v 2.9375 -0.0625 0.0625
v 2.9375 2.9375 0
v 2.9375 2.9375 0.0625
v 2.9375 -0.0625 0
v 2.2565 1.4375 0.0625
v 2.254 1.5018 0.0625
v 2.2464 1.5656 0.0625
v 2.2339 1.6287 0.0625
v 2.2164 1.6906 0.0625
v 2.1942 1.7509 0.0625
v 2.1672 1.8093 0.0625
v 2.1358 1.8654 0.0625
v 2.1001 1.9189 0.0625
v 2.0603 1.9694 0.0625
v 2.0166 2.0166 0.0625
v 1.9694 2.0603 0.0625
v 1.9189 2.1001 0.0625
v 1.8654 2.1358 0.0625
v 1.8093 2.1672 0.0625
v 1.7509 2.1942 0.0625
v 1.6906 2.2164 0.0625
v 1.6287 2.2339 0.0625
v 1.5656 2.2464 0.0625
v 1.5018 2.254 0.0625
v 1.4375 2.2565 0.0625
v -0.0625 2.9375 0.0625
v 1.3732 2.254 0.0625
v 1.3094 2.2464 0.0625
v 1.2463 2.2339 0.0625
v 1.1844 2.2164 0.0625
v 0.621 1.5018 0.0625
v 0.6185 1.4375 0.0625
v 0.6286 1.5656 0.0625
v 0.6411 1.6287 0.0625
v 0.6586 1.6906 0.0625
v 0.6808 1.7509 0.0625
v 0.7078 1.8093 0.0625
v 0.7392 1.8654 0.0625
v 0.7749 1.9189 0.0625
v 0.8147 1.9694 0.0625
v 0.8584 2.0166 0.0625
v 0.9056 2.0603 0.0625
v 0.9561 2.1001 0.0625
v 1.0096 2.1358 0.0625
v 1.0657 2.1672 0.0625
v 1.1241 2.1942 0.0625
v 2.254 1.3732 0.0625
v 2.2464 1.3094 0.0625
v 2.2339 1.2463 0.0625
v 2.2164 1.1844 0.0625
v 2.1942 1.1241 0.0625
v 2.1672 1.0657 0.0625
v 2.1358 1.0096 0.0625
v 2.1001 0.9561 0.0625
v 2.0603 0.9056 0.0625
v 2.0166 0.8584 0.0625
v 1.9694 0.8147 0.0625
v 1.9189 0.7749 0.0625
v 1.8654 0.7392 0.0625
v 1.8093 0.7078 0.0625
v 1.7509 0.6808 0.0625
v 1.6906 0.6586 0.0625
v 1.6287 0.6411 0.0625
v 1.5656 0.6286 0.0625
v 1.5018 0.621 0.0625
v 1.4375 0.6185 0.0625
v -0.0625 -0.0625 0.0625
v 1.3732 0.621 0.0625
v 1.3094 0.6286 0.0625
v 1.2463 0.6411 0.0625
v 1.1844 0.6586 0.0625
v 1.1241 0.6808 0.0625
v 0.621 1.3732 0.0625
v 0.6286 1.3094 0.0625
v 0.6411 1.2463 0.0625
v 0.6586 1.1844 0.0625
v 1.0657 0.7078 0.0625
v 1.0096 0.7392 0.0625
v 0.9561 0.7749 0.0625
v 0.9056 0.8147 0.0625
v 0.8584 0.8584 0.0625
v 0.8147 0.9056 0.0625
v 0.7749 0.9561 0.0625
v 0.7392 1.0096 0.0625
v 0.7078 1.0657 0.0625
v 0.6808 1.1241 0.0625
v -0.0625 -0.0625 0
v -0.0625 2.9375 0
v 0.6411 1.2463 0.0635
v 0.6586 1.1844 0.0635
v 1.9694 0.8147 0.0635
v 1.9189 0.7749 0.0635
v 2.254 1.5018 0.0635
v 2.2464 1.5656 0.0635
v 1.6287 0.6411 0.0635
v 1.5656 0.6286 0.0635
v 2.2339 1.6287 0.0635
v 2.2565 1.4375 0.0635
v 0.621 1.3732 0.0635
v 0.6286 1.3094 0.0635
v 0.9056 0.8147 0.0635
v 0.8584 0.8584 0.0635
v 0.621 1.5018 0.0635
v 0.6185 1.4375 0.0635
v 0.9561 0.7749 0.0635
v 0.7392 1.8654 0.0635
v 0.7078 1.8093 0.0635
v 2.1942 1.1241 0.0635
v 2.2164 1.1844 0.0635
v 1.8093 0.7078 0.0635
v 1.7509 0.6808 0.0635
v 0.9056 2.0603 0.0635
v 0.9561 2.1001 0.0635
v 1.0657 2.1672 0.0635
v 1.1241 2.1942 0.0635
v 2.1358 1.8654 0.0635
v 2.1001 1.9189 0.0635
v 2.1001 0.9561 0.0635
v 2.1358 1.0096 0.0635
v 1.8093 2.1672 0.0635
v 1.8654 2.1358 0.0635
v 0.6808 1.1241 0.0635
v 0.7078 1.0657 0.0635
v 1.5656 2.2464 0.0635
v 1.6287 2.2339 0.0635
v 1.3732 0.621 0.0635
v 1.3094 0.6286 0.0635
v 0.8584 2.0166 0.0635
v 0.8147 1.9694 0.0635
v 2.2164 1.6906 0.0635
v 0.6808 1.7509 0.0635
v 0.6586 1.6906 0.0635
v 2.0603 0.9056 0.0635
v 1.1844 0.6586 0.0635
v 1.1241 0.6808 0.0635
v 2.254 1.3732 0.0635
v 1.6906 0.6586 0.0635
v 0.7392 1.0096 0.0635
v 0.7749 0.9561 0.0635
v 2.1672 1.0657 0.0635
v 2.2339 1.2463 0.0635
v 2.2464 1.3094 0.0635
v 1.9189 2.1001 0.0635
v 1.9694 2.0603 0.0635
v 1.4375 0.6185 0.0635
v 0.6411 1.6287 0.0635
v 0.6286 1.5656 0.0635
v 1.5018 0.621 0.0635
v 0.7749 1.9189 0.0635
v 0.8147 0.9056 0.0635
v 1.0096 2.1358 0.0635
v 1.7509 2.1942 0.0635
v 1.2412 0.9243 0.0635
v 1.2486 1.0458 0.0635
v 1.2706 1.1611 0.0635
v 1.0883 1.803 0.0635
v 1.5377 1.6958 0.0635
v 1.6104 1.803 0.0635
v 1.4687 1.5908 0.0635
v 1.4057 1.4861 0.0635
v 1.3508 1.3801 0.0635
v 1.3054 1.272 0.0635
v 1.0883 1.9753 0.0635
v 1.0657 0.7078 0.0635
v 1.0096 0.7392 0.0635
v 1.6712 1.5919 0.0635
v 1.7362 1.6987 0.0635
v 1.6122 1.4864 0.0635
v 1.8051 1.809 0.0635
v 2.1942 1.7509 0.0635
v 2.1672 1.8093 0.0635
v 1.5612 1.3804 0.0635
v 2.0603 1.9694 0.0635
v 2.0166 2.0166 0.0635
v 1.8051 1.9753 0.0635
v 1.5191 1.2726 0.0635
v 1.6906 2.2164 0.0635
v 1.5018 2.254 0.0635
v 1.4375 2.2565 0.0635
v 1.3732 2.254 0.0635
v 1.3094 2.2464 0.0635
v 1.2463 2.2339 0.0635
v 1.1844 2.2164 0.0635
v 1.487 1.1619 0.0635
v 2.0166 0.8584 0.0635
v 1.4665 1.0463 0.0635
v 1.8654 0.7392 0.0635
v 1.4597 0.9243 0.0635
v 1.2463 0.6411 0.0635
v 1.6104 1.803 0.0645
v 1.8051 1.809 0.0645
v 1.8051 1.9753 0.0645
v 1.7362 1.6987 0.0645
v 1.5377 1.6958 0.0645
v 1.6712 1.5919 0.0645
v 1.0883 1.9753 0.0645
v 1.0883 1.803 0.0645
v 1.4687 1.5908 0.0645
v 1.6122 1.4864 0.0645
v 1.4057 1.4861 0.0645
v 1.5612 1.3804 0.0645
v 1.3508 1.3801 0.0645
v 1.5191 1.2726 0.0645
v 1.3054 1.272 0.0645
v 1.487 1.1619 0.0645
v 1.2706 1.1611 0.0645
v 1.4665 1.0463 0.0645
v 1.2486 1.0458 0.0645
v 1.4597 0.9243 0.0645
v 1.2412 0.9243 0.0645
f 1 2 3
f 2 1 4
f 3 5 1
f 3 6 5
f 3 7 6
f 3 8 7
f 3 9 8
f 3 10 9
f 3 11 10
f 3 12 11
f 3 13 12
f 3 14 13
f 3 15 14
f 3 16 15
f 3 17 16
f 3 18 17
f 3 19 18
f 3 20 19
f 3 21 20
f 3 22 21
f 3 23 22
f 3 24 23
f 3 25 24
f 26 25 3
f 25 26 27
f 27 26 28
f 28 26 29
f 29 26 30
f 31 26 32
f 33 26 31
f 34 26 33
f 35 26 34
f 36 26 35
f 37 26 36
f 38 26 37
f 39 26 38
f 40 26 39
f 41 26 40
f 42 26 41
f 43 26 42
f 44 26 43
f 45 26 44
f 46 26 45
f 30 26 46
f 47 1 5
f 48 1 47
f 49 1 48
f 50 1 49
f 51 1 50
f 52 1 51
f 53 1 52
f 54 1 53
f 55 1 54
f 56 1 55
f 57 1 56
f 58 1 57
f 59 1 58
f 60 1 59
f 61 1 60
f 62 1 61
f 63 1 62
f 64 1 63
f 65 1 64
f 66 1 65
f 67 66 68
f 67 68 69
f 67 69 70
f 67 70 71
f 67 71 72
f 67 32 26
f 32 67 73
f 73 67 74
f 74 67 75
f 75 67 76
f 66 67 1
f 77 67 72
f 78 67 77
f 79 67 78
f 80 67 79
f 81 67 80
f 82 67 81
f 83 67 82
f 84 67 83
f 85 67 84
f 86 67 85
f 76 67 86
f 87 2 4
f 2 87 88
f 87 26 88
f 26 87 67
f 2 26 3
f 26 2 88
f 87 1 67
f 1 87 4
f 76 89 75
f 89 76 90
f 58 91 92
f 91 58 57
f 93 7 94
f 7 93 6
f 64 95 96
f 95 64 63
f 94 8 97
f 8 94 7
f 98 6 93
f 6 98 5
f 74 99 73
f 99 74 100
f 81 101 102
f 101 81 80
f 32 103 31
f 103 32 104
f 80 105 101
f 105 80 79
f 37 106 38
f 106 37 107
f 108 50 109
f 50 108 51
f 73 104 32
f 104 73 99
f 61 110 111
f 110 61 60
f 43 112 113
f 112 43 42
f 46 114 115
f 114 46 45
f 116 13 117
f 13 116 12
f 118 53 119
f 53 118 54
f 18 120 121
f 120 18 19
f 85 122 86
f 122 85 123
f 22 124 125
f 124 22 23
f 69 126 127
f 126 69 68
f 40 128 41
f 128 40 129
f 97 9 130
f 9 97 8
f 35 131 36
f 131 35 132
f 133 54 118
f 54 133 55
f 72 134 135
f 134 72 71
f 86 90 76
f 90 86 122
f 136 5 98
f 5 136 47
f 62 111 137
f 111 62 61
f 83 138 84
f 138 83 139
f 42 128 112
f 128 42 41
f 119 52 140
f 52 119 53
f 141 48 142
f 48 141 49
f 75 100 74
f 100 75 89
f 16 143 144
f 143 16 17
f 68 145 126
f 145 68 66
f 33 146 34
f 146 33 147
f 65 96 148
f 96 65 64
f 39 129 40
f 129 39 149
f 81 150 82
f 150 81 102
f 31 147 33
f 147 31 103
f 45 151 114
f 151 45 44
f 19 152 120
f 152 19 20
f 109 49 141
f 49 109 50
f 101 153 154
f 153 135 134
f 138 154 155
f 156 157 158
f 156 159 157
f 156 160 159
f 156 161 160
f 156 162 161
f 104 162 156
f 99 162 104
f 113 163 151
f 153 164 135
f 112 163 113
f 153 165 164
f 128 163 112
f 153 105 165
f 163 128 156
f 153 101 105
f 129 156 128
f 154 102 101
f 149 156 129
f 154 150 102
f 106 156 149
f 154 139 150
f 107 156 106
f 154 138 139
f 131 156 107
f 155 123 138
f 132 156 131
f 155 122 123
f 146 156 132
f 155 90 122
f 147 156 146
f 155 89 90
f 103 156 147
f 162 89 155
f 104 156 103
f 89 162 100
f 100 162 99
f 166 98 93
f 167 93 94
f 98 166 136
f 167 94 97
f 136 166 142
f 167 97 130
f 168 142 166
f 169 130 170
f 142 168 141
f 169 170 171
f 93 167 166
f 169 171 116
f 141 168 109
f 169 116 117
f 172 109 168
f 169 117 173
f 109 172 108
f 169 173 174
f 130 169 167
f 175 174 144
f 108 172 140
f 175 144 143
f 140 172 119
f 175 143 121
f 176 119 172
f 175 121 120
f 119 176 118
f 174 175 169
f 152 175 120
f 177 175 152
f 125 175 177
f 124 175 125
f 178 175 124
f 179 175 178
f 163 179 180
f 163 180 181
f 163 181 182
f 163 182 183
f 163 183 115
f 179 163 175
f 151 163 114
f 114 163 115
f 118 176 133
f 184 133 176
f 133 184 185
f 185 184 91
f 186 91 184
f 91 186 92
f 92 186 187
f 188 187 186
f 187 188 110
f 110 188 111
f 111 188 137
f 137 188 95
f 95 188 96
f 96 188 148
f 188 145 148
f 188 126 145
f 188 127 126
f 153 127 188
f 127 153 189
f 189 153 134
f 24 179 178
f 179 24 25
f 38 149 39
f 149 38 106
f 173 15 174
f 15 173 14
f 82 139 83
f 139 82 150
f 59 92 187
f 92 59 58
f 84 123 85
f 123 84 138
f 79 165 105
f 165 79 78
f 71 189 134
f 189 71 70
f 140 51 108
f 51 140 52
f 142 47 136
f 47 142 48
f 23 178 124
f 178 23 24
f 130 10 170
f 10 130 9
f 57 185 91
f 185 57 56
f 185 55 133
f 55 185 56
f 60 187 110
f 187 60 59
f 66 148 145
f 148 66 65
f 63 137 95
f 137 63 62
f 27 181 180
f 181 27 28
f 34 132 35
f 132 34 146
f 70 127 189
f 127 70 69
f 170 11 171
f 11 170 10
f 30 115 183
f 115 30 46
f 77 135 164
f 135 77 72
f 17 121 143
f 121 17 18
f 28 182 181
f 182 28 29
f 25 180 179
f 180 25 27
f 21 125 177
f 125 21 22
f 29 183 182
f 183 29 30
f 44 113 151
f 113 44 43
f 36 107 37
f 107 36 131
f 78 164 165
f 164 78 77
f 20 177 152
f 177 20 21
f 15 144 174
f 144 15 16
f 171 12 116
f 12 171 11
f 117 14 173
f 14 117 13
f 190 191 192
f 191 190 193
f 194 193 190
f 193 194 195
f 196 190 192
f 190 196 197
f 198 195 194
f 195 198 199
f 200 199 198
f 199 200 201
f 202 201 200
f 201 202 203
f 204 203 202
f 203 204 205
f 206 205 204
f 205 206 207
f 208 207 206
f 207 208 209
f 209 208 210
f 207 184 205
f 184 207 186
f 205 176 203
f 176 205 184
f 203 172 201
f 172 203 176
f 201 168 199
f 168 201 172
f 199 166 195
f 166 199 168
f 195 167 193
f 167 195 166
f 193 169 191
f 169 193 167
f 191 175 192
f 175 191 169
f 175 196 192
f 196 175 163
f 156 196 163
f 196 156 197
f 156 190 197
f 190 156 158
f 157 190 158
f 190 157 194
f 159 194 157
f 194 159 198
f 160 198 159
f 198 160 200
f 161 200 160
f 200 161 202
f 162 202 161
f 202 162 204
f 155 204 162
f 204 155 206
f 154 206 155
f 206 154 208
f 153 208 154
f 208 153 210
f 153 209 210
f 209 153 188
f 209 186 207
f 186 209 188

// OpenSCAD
// element110.scad
// Spur gear tile — centered black gear ring with trapezoidal teeth.
// The open bore reveals a lighter interior (gear_bore module).
// Units: inches

plate_w = 2 + 7/8;
plate_d = 2 + 7/8;
plate_h = 1/16;
frame_w = 1/16;

hole_d = 3/32;
hole_r = hole_d / 2;

// Gear geometry — centered on tile
gear_n      = 20;    // number of teeth
gear_r_tip  = 1.18;  // outer radius at tooth tips
gear_r_root = 1.00;  // root radius at base of teeth
gear_r_bore = 0.82;  // bore (inner hole) radius
tooth_hw    = 4.5;   // half-angle of each tooth in degrees (total = 9°, gap = 9°)
tooth_tip_f = 0.80;  // tooth tip is narrower than base by this factor

// ── Standard modules ─────────────────────────────────────────────────────────

module rivet_holes() {
    spacing_x = plate_w / 10;
    spacing_y = plate_d / 10;
    inset_x   = spacing_x / 2;
    inset_y   = spacing_y / 2;
    // Front edge
    for (i = [0:9])
        translate([inset_x + i * spacing_x, inset_y,         -1])
            cylinder(h = plate_h + 2, r = hole_r, $fn = 20);
    // Back edge
    for (i = [0:9])
        translate([inset_x + i * spacing_x, plate_d - inset_y, -1])
            cylinder(h = plate_h + 2, r = hole_r, $fn = 20);
    // Left edge
    for (i = [0:9])
        translate([inset_x,           inset_y + i * spacing_y, -1])
            cylinder(h = plate_h + 2, r = hole_r, $fn = 20);
    // Right edge
    for (i = [0:9])
        translate([plate_w - inset_x, inset_y + i * spacing_y, -1])
            cylinder(h = plate_h + 2, r = hole_r, $fn = 20);
}

module frame() {
    color("black")
    difference() {
        translate([-frame_w, -frame_w, 0])
            cube([plate_w + 2 * frame_w, plate_d + 2 * frame_w, plate_h]);
        translate([0, 0, -0.001])
            cube([plate_w, plate_d, plate_h + 0.002]);
    }
}

module plate() {
    difference() {
        color("darkgray")
            cube([plate_w, plate_d, plate_h]);
        rivet_holes();
    }
}

rivet_h = plate_h;
module rivets() {
    spacing_x = plate_w / 10;
    spacing_y = plate_d / 10;
    inset_x   = spacing_x / 2;
    inset_y   = spacing_y / 2;
    color("lightgray") {
        for (i = [0:9])
            translate([inset_x + i * spacing_x, inset_y,         0])
                cylinder(h = rivet_h, r = hole_r, $fn = 20);
        for (i = [0:9])
            translate([inset_x + i * spacing_x, plate_d - inset_y, 0])
                cylinder(h = rivet_h, r = hole_r, $fn = 20);
        for (i = [0:9])
            translate([inset_x,           inset_y + i * spacing_y, 0])
                cylinder(h = rivet_h, r = hole_r, $fn = 20);
        for (i = [0:9])
            translate([plate_w - inset_x, inset_y + i * spacing_y, 0])
                cylinder(h = rivet_h, r = hole_r, $fn = 20);
    }
}

// ── Gear modules ─────────────────────────────────────────────────────────────

// Single trapezoidal tooth pointing in +x direction (before rotation)
module gear_tooth_2d() {
    polygon([
        [gear_r_root * cos(-tooth_hw),             gear_r_root * sin(-tooth_hw)],
        [gear_r_tip  * cos(-tooth_hw * tooth_tip_f), gear_r_tip  * sin(-tooth_hw * tooth_tip_f)],
        [gear_r_tip  * cos( tooth_hw * tooth_tip_f), gear_r_tip  * sin( tooth_hw * tooth_tip_f)],
        [gear_r_root * cos( tooth_hw),             gear_r_root * sin( tooth_hw)],
    ]);
}

// Full 2D gear profile (ring + teeth, without bore subtracted)
module gear_2d() {
    pitch = 360 / gear_n;
    union() {
        circle(r = gear_r_root, $fn = gear_n * 8);
        for (i = [0:gear_n - 1])
            rotate([0, 0, i * pitch])
                gear_tooth_2d();
    }
}

// Black gear ring + teeth with open bore
module gear() {
    color("black")
    translate([plate_w / 2, plate_d / 2, 0])
    linear_extrude(plate_h)
    difference() {
        gear_2d();
        circle(r = gear_r_bore, $fn = 80);
    }
}

// Lighter fill inside the bore (silver interior visible through center)
module gear_bore() {
    color([0.80, 0.80, 0.80])
    translate([plate_w / 2, plate_d / 2, 0])
    linear_extrude(plate_h + 0.001)
    circle(r = gear_r_bore - 0.001, $fn = 80);
}

// Green "1" centered inside the bore
module gear_label() {
    color("green")
    translate([plate_w / 2, plate_d / 2, 0])
    linear_extrude(plate_h + 0.002)
    text("7", size = 1.1, halign = "center", valign = "center",
         font = "Liberation Sans:style=Bold");
}

// ── Assembly ─────────────────────────────────────────────────────────────────

frame();
plate();
rivets();
gear_bore();
gear();
gear_label();
